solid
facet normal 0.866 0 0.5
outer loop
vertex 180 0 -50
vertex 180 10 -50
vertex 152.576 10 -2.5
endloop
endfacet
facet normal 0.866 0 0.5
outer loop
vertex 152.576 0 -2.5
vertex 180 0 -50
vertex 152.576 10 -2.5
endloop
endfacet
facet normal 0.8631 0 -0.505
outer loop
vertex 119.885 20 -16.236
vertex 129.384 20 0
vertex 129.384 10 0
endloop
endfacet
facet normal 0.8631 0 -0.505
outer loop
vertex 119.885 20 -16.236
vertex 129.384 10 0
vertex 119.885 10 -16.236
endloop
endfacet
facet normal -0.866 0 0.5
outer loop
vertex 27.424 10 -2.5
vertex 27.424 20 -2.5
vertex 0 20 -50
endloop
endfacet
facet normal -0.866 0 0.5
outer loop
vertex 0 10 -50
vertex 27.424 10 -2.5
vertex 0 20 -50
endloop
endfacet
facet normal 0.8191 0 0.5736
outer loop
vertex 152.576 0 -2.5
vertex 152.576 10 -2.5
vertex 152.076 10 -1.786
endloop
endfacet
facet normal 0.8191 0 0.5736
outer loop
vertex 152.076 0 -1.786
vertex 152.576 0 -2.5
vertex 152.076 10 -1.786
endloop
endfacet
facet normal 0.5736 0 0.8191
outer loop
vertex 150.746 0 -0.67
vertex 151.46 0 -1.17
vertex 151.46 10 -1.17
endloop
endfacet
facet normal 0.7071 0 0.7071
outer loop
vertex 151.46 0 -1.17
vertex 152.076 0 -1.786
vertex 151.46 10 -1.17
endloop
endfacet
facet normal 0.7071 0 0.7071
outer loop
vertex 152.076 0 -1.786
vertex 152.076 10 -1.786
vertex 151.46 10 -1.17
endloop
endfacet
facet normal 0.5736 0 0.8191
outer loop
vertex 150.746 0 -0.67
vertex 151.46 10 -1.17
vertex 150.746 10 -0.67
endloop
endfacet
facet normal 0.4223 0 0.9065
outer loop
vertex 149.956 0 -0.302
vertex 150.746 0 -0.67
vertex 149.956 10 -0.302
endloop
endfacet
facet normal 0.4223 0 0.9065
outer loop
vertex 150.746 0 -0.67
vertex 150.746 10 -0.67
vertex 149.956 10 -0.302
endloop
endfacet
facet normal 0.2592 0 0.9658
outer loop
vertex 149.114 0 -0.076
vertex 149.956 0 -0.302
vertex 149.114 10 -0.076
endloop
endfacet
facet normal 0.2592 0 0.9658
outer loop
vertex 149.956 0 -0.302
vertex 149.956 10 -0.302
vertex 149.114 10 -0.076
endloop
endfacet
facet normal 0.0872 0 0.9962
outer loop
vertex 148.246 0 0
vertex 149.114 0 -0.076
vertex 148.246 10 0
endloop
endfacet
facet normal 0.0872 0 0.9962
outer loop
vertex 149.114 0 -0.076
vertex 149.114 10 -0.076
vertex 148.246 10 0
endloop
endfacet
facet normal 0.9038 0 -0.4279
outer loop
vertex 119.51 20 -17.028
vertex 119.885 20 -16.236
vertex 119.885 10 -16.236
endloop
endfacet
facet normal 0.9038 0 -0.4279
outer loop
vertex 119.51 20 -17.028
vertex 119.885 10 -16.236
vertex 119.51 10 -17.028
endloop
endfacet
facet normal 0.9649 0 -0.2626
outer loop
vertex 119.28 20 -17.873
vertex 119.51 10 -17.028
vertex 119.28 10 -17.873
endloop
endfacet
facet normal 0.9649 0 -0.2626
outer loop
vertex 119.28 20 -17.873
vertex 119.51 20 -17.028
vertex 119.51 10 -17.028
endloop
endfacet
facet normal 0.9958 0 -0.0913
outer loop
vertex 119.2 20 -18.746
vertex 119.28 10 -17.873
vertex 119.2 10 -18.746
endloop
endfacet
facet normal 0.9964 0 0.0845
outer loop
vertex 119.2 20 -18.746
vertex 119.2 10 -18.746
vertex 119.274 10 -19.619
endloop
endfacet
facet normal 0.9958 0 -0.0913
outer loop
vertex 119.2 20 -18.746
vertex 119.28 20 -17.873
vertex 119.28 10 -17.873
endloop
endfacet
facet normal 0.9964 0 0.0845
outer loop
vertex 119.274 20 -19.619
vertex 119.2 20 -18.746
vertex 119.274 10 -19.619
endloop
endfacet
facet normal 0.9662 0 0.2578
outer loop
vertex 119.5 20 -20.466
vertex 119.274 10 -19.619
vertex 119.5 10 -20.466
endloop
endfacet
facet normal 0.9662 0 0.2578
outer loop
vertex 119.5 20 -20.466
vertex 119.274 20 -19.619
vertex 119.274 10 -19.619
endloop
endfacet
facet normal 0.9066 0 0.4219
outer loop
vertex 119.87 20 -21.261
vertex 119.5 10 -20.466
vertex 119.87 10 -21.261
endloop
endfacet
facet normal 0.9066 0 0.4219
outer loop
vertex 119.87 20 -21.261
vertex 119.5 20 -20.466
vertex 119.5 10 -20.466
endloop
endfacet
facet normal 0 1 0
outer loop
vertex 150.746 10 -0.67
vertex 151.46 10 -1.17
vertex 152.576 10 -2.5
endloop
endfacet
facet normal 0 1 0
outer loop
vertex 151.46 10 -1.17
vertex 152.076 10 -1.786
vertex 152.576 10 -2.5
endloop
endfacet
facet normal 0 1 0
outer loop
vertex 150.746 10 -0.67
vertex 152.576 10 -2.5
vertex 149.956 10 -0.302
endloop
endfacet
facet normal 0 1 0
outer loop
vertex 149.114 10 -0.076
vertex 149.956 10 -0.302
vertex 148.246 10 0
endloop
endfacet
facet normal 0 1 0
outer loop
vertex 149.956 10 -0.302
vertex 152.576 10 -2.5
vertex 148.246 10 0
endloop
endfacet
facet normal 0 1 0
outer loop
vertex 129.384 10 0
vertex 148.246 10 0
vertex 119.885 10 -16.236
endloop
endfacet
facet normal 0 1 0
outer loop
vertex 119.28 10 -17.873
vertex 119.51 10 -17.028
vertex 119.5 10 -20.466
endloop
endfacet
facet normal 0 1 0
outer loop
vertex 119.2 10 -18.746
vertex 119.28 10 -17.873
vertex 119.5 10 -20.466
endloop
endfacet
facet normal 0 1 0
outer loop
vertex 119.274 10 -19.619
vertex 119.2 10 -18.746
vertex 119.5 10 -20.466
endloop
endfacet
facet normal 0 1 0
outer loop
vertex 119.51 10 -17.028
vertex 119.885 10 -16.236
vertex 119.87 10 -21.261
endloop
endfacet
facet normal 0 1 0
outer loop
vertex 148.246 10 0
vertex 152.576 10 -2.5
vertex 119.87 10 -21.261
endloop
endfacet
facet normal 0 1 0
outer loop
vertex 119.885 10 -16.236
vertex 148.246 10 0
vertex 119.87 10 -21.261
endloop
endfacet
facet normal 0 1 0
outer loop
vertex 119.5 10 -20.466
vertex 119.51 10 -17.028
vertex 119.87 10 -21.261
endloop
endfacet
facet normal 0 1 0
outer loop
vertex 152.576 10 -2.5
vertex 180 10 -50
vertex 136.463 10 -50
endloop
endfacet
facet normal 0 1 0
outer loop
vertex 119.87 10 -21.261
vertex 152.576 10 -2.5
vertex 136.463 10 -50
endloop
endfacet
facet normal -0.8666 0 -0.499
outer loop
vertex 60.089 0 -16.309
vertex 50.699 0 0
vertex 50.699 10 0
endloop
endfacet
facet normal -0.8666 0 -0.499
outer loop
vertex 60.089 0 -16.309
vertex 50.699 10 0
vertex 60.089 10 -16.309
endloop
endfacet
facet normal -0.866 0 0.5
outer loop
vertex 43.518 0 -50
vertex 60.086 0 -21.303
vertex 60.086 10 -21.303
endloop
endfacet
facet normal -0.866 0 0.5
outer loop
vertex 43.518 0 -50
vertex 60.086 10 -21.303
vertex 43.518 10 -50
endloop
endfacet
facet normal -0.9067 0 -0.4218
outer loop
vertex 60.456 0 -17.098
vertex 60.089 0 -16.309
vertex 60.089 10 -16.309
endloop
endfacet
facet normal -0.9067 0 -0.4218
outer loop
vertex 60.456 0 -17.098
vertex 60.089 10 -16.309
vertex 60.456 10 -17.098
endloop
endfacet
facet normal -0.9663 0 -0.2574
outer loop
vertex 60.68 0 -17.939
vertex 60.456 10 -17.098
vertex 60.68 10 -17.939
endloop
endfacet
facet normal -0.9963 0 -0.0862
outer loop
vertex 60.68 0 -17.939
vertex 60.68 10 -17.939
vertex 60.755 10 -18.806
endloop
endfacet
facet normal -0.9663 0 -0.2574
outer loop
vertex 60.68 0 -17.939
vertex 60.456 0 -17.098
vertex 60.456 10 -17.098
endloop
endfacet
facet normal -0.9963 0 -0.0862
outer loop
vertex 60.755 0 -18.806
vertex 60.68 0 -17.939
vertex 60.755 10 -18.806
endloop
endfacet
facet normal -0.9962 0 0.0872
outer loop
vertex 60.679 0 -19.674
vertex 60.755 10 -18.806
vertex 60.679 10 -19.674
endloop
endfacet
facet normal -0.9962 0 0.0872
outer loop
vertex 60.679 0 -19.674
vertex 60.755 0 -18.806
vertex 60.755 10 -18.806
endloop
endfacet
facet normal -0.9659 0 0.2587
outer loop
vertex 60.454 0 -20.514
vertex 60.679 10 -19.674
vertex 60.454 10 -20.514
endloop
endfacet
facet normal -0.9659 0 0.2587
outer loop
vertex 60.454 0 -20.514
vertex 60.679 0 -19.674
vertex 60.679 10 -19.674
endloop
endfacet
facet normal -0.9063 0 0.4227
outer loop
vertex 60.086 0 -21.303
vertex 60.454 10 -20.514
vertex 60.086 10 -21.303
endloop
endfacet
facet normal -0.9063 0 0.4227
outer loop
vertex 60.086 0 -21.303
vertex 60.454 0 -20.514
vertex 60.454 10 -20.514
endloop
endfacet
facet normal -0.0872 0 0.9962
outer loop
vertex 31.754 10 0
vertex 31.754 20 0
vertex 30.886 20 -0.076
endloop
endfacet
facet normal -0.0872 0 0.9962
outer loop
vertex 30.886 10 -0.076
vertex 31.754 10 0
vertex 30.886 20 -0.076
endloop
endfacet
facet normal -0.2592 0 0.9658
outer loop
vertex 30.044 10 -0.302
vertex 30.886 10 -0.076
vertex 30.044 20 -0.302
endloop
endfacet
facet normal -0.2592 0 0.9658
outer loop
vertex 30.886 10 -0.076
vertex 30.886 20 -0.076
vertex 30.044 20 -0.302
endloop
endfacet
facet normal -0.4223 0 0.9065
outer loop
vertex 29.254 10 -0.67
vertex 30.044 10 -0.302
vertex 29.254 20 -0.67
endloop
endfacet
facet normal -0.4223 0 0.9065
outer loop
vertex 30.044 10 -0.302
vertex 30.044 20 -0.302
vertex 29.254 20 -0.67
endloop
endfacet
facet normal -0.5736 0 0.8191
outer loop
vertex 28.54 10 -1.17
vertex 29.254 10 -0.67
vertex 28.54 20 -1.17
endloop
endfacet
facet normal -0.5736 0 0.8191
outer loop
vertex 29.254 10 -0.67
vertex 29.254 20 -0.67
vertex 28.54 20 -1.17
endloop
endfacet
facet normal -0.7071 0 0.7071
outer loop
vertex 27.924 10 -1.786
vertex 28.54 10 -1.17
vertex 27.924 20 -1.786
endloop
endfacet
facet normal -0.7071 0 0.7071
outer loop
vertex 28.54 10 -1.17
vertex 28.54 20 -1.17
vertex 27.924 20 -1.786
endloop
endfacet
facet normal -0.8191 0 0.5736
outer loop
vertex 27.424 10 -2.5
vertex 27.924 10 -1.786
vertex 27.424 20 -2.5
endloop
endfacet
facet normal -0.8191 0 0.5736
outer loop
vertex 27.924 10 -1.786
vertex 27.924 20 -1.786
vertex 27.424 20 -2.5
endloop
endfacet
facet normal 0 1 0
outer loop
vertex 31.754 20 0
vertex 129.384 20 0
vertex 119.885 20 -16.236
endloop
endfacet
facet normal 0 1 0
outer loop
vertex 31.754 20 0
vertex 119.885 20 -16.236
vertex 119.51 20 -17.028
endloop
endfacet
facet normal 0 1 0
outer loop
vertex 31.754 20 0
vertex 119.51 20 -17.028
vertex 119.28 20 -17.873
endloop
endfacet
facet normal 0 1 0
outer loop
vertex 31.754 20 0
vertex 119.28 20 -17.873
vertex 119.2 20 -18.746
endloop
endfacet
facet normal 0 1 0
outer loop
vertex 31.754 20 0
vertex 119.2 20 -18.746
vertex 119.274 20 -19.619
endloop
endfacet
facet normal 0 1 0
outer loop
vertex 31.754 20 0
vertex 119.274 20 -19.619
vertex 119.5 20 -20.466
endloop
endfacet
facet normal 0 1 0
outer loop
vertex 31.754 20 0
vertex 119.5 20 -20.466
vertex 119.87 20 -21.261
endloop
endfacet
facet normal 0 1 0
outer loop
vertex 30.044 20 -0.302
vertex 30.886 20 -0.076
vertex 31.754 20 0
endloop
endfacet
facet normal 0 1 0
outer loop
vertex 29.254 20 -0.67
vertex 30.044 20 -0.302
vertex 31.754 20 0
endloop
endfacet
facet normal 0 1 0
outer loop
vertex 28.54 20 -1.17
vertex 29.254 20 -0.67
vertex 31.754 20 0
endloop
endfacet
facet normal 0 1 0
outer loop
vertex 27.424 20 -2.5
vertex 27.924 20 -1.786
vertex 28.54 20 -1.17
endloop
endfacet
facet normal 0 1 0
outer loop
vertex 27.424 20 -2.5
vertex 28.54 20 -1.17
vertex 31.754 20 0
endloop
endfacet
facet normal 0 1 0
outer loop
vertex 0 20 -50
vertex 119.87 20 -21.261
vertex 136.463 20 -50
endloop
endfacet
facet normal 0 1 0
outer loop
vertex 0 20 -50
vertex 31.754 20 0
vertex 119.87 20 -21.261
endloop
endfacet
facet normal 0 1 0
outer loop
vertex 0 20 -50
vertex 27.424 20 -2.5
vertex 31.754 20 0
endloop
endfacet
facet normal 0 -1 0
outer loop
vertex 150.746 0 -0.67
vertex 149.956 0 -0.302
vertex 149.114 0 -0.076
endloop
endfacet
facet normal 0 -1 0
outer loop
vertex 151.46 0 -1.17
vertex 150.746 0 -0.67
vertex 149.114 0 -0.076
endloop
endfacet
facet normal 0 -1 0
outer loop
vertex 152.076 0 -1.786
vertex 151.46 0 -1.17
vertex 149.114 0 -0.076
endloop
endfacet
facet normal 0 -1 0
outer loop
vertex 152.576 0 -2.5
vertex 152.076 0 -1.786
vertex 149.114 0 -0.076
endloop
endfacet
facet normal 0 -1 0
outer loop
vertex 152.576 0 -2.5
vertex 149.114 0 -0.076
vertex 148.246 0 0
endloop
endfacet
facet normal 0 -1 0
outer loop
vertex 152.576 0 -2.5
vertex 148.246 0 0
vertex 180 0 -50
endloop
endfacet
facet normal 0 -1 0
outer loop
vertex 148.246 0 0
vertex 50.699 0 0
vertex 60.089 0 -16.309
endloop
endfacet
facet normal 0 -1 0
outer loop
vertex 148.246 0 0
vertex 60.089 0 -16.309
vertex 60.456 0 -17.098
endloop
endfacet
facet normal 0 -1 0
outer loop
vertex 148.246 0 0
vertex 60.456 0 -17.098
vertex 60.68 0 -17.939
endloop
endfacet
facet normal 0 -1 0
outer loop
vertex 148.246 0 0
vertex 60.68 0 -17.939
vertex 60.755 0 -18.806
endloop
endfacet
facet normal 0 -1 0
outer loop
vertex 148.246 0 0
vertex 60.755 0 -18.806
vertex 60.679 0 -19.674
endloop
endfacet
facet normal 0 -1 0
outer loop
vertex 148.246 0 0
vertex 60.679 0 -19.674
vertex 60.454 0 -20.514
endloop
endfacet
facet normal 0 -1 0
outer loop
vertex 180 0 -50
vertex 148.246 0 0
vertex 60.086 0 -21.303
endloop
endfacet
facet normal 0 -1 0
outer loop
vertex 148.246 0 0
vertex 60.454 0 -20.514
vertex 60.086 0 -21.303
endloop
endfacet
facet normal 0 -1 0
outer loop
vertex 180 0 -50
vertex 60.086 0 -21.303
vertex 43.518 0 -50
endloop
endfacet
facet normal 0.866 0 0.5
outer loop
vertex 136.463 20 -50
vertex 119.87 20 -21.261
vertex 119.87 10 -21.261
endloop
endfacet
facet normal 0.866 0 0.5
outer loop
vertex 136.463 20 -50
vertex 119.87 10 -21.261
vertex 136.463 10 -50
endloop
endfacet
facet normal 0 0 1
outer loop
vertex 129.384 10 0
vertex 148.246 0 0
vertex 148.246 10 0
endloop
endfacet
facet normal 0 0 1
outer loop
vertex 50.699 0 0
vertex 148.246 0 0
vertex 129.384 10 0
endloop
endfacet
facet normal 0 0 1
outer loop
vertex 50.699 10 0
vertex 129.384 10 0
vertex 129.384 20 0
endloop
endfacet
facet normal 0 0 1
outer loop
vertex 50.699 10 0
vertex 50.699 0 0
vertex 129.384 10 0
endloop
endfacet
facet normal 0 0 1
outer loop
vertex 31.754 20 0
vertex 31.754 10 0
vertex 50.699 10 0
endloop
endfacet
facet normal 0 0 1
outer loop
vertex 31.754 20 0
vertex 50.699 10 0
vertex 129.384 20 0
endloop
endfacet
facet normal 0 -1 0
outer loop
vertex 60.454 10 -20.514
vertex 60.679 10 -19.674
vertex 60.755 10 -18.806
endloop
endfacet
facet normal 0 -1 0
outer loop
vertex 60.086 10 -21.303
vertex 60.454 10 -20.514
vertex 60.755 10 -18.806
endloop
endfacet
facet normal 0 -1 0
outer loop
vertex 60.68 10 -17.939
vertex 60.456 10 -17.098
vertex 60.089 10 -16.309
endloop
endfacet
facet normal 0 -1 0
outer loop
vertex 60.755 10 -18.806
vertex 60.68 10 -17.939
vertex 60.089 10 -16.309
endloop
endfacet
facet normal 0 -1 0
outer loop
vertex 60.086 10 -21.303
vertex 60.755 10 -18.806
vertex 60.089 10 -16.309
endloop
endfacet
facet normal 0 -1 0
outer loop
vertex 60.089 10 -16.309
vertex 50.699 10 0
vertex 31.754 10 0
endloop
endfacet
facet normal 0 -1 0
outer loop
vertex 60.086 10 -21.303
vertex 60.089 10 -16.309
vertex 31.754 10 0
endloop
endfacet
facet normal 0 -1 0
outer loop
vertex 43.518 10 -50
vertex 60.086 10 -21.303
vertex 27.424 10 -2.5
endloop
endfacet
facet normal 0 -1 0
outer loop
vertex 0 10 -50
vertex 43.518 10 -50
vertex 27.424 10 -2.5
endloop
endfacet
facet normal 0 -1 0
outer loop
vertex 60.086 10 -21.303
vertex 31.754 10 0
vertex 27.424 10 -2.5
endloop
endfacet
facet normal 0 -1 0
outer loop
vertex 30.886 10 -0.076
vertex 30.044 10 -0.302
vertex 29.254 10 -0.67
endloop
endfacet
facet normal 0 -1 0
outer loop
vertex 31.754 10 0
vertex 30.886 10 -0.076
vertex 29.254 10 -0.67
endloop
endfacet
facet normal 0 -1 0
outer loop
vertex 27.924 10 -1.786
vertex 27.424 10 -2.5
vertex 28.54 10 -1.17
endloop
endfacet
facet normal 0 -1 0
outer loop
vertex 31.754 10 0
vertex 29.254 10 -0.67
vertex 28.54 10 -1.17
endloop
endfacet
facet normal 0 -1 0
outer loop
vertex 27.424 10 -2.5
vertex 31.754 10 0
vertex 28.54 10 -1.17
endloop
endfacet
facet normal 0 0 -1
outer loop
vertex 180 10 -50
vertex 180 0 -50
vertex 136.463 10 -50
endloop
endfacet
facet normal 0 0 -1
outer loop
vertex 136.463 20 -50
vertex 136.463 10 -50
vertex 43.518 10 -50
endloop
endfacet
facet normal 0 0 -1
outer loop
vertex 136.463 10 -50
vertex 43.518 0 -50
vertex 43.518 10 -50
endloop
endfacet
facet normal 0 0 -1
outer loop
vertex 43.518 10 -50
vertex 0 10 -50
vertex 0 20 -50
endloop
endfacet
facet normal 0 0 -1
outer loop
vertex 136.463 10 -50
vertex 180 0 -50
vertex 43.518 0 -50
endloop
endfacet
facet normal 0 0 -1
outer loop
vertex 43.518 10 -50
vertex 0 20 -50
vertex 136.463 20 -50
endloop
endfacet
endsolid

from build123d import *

# Parameters (mm, degrees)
SKETCH_1_W          = 50
SKETCH_1_H          = 20
EXTRUDE_1_DEPTH     = 180
CUT_EXTRUDE_1_DEPTH = 10
CUT_EXTRUDE_2_DEPTH = 10
SKETCH_4_OUTSIDE_W  = 219.576
SKETCH_4_OUTSIDE_H  = 89.576
CUT_EXTRUDE_4_DEPTH = 21


with BuildPart() as part:
    # Эскиз1 → Бобышка-Вытянуть1 (new body)
    with BuildSketch(Plane(origin=(0, 0, 0), x_dir=(0, 0, -1), z_dir=(1, 0, 0))):
        with Locations((25, 10)):
            Rectangle(SKETCH_1_W, SKETCH_1_H)
    extrude(amount=EXTRUDE_1_DEPTH)

    # Эскиз2 → Вырез-Вытянуть1 (cut)
    with BuildSketch(Plane.XZ):
        with BuildLine():
            Line((43.517527849, -50), (0, -50))
            Line((0, -50), (0, 0))
            Line((0, 0), (50.69898236, 0))
            Line((50.69898236, 0), (60.088568146, -16.308535178))
            ThreePointArc((60.088568146, -16.308535178), (60.755434633, -18.806330829), (60.085562557, -21.303322104))
            Line((60.085562557, -21.303322104), (43.517527849, -50))
        make_face()
    extrude(amount=-CUT_EXTRUDE_1_DEPTH, mode=Mode.SUBTRACT)

    # Эскиз3 → Вырез-Вытянуть2 (cut)
    with BuildSketch(Plane(origin=(0, 20, 0), x_dir=(1, 0, 0), z_dir=(0, 1, 0))):
        with BuildLine():
            Line((119.870060572, 21.260602823), (136.462759268, 50))
            Line((136.462759268, 50), (180, 50))
            Line((180, 50), (180, 0))
            Line((180, 0), (129.384239064, 0))
            Line((129.384239064, 0), (119.884637949, 16.23552237))
            ThreePointArc((119.884637949, 16.23552237), (119.200208629, 18.746098263), (119.870060572, 21.260602823))
        make_face()
    extrude(amount=-CUT_EXTRUDE_2_DEPTH, mode=Mode.SUBTRACT)

    # Эскиз4 outside → Вырез-Вытянуть4 (cut, through all)
    with BuildSketch(Plane(origin=(0, 20, 0), x_dir=(1, 0, 0), z_dir=(0, 1, 0))):
        with Locations((90, 25)):
            Rectangle(SKETCH_4_OUTSIDE_W, SKETCH_4_OUTSIDE_H)
        with BuildLine():
            Line((180, 50), (152.575862213, 2.5))
            ThreePointArc((152.575862213, 2.5), (150.745735195, 0.669872981), (148.245735195, 0))
            Line((148.245735195, 0), (31.754264805, 0))
            ThreePointArc((31.754264805, 0), (29.254264805, 0.669872981), (27.424137787, 2.5))
            Line((27.424137787, 2.5), (0, 50))
            Line((0, 50), (180, 50))
        make_face(mode=Mode.SUBTRACT)
    extrude(amount=-CUT_EXTRUDE_4_DEPTH, mode=Mode.SUBTRACT)


solid = part.part
